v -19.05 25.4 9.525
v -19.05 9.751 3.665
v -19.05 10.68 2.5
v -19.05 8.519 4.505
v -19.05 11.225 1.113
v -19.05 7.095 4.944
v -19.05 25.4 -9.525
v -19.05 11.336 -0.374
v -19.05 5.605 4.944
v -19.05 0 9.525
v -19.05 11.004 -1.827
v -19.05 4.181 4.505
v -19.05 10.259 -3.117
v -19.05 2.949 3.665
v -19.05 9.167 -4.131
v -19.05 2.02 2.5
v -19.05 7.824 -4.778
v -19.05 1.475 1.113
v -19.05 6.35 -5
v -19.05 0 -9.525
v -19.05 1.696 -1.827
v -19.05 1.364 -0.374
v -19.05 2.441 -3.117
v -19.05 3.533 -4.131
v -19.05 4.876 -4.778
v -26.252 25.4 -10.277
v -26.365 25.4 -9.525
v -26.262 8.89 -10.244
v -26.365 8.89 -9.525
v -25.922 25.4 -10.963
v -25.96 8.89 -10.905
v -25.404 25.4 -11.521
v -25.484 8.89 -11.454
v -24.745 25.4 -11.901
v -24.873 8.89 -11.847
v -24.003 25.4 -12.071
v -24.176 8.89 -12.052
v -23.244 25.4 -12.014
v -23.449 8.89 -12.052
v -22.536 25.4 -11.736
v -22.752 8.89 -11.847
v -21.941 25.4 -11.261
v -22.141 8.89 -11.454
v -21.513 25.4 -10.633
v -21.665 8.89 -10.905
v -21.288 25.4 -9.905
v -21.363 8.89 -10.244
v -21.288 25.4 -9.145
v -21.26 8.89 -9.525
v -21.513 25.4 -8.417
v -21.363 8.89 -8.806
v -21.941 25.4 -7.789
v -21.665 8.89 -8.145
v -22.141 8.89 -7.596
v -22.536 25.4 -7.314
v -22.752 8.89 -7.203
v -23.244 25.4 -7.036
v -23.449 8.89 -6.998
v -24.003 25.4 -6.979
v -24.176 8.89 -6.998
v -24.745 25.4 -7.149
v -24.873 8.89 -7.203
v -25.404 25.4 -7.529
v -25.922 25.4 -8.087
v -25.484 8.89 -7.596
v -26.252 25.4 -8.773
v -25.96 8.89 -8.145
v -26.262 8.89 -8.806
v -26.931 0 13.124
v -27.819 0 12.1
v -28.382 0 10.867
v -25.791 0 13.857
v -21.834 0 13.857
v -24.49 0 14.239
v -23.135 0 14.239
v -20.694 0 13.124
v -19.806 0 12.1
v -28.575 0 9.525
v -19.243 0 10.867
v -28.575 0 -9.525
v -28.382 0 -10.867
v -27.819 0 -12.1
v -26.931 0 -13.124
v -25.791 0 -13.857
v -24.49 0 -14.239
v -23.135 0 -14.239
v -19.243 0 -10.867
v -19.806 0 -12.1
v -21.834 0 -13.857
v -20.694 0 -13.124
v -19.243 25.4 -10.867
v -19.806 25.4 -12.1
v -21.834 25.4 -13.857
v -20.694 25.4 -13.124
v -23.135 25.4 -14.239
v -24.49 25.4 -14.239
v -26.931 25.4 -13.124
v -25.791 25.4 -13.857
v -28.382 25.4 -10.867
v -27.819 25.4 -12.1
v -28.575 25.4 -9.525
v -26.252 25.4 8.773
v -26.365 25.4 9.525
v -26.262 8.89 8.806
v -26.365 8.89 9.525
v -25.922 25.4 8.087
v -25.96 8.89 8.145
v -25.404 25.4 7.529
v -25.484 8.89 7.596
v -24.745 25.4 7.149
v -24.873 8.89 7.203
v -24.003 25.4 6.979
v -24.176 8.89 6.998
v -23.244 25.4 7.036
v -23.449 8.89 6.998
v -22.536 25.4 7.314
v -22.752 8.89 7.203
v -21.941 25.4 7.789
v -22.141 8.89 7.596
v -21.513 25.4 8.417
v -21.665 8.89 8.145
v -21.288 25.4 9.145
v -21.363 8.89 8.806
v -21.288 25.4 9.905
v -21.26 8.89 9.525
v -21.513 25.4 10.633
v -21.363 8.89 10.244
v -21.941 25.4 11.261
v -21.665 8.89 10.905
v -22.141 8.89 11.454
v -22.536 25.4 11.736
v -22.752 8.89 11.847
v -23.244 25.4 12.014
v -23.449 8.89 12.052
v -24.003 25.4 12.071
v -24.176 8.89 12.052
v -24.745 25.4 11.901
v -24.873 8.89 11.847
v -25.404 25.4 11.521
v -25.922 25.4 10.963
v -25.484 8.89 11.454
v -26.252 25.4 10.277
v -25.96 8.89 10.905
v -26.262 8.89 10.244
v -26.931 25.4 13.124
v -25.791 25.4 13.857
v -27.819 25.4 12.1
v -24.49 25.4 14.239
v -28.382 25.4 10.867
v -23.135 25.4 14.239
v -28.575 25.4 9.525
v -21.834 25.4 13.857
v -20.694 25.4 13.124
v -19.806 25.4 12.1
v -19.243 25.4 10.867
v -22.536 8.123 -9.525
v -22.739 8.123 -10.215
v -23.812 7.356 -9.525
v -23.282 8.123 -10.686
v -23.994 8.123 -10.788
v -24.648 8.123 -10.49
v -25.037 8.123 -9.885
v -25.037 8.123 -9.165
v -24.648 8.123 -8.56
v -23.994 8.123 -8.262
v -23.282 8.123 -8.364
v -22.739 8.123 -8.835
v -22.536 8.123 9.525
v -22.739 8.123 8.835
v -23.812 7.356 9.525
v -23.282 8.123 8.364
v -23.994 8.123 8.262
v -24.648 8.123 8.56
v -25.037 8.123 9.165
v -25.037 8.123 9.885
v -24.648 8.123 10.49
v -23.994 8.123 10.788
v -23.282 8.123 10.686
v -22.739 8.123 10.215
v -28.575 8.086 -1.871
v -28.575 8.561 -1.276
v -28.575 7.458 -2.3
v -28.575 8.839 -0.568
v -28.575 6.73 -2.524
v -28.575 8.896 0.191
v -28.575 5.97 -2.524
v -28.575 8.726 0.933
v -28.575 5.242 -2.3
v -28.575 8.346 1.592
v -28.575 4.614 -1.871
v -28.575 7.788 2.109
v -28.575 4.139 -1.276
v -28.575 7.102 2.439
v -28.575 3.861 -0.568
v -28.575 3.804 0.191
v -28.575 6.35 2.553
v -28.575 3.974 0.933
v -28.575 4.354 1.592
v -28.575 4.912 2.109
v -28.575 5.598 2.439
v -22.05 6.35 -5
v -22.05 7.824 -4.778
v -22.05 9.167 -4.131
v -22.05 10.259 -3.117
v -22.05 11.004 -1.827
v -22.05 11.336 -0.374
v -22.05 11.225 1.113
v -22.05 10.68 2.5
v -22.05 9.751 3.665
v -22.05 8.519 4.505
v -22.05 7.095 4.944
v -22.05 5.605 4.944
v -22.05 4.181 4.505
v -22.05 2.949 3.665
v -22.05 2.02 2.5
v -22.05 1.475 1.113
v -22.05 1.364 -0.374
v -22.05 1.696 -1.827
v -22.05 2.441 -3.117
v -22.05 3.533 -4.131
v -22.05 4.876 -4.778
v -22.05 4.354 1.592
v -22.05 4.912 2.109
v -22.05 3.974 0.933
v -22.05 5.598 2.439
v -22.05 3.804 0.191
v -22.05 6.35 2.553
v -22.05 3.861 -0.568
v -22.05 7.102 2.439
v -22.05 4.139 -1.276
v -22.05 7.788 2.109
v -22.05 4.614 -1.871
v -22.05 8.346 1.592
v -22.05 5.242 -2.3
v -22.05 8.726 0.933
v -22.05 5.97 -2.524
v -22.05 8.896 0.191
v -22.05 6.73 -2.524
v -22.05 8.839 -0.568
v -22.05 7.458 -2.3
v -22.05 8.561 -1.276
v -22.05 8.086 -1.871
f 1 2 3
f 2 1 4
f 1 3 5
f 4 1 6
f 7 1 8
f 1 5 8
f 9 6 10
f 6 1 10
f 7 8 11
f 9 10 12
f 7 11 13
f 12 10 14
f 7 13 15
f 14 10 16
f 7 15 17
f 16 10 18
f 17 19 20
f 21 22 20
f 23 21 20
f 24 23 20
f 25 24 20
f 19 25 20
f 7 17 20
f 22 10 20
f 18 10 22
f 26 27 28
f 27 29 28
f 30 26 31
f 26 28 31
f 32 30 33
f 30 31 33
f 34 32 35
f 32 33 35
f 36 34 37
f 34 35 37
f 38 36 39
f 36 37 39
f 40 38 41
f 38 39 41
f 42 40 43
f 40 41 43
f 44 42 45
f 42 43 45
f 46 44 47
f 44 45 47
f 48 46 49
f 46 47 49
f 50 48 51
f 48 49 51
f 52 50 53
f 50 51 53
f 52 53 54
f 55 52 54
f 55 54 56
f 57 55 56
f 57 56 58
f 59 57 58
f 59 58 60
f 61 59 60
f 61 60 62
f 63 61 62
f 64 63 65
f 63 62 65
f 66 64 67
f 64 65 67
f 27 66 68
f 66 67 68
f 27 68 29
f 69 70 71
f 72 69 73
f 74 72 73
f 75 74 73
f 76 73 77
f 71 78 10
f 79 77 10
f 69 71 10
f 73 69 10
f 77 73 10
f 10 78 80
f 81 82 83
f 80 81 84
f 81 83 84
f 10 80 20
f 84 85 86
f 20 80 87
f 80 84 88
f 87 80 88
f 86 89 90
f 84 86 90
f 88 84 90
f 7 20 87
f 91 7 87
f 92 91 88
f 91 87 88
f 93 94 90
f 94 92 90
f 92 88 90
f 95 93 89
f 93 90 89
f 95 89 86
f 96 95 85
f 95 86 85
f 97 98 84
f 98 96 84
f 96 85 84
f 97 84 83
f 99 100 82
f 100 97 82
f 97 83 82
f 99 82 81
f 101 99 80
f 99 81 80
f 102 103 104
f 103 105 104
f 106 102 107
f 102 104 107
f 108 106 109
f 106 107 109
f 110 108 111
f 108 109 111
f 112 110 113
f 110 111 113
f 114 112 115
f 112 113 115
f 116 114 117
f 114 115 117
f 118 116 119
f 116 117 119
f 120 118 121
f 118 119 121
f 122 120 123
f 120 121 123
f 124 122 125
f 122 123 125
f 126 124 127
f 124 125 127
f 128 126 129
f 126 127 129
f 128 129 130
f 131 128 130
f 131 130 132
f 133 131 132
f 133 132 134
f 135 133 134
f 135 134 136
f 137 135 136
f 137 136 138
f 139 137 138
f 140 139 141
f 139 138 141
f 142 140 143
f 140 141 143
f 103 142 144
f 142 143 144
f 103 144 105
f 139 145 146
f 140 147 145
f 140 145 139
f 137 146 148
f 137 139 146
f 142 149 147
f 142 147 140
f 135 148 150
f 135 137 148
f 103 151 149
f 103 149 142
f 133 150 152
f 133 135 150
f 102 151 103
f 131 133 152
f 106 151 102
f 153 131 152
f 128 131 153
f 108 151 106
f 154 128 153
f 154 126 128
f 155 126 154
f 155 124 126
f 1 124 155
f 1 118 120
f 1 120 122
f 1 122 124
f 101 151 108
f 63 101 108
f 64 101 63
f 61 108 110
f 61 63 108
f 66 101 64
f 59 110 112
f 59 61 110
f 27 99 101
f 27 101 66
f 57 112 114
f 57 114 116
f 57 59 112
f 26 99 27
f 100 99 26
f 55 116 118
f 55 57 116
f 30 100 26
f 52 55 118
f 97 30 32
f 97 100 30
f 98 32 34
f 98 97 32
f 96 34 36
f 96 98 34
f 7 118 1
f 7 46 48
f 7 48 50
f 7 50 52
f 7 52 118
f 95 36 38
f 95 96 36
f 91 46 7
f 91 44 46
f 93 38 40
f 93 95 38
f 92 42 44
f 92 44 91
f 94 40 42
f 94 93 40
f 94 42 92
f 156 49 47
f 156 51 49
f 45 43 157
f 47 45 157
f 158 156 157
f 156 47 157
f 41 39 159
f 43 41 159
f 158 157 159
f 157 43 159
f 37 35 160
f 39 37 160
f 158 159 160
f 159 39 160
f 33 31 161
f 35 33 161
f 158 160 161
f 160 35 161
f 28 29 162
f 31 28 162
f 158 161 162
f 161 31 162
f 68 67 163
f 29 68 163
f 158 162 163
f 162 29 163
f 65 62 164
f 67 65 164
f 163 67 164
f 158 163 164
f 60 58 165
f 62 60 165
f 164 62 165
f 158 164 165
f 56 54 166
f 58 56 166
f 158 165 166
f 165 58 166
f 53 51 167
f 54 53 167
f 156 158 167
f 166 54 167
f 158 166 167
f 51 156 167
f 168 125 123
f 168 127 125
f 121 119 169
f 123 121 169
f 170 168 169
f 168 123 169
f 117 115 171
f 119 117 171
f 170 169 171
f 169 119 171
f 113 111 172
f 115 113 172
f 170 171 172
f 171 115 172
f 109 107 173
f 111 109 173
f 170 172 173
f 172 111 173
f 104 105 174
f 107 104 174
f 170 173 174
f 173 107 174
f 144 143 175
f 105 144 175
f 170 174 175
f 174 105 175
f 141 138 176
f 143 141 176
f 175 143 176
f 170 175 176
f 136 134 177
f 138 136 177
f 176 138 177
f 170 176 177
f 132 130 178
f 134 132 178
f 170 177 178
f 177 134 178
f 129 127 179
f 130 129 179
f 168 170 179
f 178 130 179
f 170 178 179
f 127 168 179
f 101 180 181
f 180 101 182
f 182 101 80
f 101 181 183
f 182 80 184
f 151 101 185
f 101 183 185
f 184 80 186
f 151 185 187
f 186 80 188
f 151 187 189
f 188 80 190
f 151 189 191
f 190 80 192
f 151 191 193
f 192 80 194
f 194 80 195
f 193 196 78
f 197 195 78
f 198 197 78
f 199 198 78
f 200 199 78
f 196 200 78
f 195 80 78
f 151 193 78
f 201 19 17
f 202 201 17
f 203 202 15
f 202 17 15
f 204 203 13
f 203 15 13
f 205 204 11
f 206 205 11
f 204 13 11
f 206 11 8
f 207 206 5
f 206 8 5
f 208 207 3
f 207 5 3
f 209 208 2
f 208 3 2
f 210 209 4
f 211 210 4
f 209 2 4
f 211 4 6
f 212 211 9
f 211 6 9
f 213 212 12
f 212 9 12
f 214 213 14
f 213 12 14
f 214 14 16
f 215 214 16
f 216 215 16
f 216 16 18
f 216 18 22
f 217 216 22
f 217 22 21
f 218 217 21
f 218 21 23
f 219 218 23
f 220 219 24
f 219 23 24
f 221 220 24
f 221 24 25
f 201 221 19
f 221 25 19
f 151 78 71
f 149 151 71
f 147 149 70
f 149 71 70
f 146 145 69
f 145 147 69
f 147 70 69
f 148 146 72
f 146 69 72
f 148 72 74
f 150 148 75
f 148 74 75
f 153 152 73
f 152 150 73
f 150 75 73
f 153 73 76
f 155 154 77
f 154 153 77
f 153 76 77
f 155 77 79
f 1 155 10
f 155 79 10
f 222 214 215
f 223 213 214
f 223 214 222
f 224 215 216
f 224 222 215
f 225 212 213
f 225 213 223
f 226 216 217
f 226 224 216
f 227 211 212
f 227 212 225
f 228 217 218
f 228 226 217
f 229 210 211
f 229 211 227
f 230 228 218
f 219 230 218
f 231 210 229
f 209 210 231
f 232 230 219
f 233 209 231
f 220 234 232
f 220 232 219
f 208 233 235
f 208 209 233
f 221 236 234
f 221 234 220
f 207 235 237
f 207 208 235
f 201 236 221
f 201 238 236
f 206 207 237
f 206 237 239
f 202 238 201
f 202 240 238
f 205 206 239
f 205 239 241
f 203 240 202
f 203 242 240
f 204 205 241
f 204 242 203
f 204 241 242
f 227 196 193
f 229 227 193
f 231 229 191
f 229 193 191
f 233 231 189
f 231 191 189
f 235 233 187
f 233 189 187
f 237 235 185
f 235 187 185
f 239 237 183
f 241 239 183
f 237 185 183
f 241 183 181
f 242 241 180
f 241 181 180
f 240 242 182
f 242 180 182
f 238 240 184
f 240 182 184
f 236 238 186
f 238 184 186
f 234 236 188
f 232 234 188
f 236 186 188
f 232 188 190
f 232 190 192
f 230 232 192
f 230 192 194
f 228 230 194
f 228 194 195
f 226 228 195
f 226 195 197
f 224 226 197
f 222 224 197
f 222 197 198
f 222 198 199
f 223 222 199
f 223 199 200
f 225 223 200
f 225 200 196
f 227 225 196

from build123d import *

# Parameters (mm, degrees)
SKETCH8_W                   = 15.875
SKETCH8_H                   = 38.1
BOSS_EXTRUDE2_DEPTH         = 25.4
F_1_4_20_TAPPED_HOLE1_D     = 5.1054
F_1_4_20_TAPPED_HOLE1_DEPTH = 16.51
F_1_4_20_TAPPED_HOLE1_TIP   = 1.533816902
SKETCH10_W                  = 15.875
SKETCH10_H                  = 38.1
CUT_EXTRUDE2_DEPTH          = 26.4
CUT_EXTRUDE5_START          = -19.05
SKETCH13_R                  = 5.000000033
SKETCH13_R_2                = 3.175
CUT_EXTRUDE5_DEPTH          = 3
F_1_4_20_TAPPED_HOLE2_D     = 5.1054
F_1_4_20_TAPPED_HOLE2_DEPTH = 16.51
F_1_4_20_TAPPED_HOLE2_TIP   = 1.533816902


with BuildPart() as part:
    # Sketch8 → Boss-Extrude2 (new body)
    with BuildSketch(Plane(origin=(0, 0, 0), x_dir=(1, 0, 0), z_dir=(0, 1, 0))):
        with Locations((-23.8125, 0)):
            Rectangle(SKETCH8_W, SKETCH8_H)
    extrude(amount=BOSS_EXTRUDE2_DEPTH)

    # 1/4-20 Tapped Hole1
    with Locations(Plane(origin=(0, 25.4, 0), x_dir=(1, 0, 0), z_dir=(0, 1, 0))):
        with Locations((-23.8125, 9.525), (-23.8125, -9.525)):
            Hole(F_1_4_20_TAPPED_HOLE1_D / 2, depth=F_1_4_20_TAPPED_HOLE1_DEPTH)
            with Locations((0, 0, -(F_1_4_20_TAPPED_HOLE1_DEPTH + F_1_4_20_TAPPED_HOLE1_TIP / 2))):  # 118° drill point
                Cone(0, F_1_4_20_TAPPED_HOLE1_D / 2, F_1_4_20_TAPPED_HOLE1_TIP, mode=Mode.SUBTRACT)

    # Sketch10 → Cut-Extrude2 (cut, through all)
    with BuildSketch(Plane(origin=(0, 0, 0), x_dir=(1, 0, 0), z_dir=(0, 1, 0))):
        with Locations((-23.8125, 0)):
            Rectangle(SKETCH10_W, SKETCH10_H)
        with BuildLine():
            Line((-28.575, 9.525), (-28.575, -9.525))
            ThreePointArc((-28.575, -9.525), (-23.8125, -14.2875), (-19.05, -9.525))
            Line((-19.05, -9.525), (-19.05, 9.525))
            ThreePointArc((-19.05, 9.525), (-23.8125, 14.2875), (-28.575, 9.525))
        make_face(mode=Mode.SUBTRACT)
    extrude(amount=CUT_EXTRUDE2_DEPTH, mode=Mode.SUBTRACT)

    # Sketch13 → Cut-Extrude5 (cut)
    with BuildSketch(Plane(origin=(0, 0, 0), x_dir=(0, 0, -1), z_dir=(1, 0, 0)).offset(CUT_EXTRUDE5_START)):
        with Locations((0, 6.35)):
            Circle(SKETCH13_R)
        with Locations((0, 6.35)):
            Circle(SKETCH13_R_2, mode=Mode.SUBTRACT)
        with Locations((0, 6.35)):
            Circle(SKETCH13_R_2)
    extrude(amount=-CUT_EXTRUDE5_DEPTH, mode=Mode.SUBTRACT)

    # 1/4-20 Tapped Hole2
    with Locations(Plane(origin=(-19.05, 0, 0), x_dir=(0, 0, -1), z_dir=(1, 0, 0))):
        with Locations((0, 6.35)):
            Hole(F_1_4_20_TAPPED_HOLE2_D / 2, depth=F_1_4_20_TAPPED_HOLE2_DEPTH)
            with Locations((0, 0, -(F_1_4_20_TAPPED_HOLE2_DEPTH + F_1_4_20_TAPPED_HOLE2_TIP / 2))):  # 118° drill point
                Cone(0, F_1_4_20_TAPPED_HOLE2_D / 2, F_1_4_20_TAPPED_HOLE2_TIP, mode=Mode.SUBTRACT)


solid = part.part
